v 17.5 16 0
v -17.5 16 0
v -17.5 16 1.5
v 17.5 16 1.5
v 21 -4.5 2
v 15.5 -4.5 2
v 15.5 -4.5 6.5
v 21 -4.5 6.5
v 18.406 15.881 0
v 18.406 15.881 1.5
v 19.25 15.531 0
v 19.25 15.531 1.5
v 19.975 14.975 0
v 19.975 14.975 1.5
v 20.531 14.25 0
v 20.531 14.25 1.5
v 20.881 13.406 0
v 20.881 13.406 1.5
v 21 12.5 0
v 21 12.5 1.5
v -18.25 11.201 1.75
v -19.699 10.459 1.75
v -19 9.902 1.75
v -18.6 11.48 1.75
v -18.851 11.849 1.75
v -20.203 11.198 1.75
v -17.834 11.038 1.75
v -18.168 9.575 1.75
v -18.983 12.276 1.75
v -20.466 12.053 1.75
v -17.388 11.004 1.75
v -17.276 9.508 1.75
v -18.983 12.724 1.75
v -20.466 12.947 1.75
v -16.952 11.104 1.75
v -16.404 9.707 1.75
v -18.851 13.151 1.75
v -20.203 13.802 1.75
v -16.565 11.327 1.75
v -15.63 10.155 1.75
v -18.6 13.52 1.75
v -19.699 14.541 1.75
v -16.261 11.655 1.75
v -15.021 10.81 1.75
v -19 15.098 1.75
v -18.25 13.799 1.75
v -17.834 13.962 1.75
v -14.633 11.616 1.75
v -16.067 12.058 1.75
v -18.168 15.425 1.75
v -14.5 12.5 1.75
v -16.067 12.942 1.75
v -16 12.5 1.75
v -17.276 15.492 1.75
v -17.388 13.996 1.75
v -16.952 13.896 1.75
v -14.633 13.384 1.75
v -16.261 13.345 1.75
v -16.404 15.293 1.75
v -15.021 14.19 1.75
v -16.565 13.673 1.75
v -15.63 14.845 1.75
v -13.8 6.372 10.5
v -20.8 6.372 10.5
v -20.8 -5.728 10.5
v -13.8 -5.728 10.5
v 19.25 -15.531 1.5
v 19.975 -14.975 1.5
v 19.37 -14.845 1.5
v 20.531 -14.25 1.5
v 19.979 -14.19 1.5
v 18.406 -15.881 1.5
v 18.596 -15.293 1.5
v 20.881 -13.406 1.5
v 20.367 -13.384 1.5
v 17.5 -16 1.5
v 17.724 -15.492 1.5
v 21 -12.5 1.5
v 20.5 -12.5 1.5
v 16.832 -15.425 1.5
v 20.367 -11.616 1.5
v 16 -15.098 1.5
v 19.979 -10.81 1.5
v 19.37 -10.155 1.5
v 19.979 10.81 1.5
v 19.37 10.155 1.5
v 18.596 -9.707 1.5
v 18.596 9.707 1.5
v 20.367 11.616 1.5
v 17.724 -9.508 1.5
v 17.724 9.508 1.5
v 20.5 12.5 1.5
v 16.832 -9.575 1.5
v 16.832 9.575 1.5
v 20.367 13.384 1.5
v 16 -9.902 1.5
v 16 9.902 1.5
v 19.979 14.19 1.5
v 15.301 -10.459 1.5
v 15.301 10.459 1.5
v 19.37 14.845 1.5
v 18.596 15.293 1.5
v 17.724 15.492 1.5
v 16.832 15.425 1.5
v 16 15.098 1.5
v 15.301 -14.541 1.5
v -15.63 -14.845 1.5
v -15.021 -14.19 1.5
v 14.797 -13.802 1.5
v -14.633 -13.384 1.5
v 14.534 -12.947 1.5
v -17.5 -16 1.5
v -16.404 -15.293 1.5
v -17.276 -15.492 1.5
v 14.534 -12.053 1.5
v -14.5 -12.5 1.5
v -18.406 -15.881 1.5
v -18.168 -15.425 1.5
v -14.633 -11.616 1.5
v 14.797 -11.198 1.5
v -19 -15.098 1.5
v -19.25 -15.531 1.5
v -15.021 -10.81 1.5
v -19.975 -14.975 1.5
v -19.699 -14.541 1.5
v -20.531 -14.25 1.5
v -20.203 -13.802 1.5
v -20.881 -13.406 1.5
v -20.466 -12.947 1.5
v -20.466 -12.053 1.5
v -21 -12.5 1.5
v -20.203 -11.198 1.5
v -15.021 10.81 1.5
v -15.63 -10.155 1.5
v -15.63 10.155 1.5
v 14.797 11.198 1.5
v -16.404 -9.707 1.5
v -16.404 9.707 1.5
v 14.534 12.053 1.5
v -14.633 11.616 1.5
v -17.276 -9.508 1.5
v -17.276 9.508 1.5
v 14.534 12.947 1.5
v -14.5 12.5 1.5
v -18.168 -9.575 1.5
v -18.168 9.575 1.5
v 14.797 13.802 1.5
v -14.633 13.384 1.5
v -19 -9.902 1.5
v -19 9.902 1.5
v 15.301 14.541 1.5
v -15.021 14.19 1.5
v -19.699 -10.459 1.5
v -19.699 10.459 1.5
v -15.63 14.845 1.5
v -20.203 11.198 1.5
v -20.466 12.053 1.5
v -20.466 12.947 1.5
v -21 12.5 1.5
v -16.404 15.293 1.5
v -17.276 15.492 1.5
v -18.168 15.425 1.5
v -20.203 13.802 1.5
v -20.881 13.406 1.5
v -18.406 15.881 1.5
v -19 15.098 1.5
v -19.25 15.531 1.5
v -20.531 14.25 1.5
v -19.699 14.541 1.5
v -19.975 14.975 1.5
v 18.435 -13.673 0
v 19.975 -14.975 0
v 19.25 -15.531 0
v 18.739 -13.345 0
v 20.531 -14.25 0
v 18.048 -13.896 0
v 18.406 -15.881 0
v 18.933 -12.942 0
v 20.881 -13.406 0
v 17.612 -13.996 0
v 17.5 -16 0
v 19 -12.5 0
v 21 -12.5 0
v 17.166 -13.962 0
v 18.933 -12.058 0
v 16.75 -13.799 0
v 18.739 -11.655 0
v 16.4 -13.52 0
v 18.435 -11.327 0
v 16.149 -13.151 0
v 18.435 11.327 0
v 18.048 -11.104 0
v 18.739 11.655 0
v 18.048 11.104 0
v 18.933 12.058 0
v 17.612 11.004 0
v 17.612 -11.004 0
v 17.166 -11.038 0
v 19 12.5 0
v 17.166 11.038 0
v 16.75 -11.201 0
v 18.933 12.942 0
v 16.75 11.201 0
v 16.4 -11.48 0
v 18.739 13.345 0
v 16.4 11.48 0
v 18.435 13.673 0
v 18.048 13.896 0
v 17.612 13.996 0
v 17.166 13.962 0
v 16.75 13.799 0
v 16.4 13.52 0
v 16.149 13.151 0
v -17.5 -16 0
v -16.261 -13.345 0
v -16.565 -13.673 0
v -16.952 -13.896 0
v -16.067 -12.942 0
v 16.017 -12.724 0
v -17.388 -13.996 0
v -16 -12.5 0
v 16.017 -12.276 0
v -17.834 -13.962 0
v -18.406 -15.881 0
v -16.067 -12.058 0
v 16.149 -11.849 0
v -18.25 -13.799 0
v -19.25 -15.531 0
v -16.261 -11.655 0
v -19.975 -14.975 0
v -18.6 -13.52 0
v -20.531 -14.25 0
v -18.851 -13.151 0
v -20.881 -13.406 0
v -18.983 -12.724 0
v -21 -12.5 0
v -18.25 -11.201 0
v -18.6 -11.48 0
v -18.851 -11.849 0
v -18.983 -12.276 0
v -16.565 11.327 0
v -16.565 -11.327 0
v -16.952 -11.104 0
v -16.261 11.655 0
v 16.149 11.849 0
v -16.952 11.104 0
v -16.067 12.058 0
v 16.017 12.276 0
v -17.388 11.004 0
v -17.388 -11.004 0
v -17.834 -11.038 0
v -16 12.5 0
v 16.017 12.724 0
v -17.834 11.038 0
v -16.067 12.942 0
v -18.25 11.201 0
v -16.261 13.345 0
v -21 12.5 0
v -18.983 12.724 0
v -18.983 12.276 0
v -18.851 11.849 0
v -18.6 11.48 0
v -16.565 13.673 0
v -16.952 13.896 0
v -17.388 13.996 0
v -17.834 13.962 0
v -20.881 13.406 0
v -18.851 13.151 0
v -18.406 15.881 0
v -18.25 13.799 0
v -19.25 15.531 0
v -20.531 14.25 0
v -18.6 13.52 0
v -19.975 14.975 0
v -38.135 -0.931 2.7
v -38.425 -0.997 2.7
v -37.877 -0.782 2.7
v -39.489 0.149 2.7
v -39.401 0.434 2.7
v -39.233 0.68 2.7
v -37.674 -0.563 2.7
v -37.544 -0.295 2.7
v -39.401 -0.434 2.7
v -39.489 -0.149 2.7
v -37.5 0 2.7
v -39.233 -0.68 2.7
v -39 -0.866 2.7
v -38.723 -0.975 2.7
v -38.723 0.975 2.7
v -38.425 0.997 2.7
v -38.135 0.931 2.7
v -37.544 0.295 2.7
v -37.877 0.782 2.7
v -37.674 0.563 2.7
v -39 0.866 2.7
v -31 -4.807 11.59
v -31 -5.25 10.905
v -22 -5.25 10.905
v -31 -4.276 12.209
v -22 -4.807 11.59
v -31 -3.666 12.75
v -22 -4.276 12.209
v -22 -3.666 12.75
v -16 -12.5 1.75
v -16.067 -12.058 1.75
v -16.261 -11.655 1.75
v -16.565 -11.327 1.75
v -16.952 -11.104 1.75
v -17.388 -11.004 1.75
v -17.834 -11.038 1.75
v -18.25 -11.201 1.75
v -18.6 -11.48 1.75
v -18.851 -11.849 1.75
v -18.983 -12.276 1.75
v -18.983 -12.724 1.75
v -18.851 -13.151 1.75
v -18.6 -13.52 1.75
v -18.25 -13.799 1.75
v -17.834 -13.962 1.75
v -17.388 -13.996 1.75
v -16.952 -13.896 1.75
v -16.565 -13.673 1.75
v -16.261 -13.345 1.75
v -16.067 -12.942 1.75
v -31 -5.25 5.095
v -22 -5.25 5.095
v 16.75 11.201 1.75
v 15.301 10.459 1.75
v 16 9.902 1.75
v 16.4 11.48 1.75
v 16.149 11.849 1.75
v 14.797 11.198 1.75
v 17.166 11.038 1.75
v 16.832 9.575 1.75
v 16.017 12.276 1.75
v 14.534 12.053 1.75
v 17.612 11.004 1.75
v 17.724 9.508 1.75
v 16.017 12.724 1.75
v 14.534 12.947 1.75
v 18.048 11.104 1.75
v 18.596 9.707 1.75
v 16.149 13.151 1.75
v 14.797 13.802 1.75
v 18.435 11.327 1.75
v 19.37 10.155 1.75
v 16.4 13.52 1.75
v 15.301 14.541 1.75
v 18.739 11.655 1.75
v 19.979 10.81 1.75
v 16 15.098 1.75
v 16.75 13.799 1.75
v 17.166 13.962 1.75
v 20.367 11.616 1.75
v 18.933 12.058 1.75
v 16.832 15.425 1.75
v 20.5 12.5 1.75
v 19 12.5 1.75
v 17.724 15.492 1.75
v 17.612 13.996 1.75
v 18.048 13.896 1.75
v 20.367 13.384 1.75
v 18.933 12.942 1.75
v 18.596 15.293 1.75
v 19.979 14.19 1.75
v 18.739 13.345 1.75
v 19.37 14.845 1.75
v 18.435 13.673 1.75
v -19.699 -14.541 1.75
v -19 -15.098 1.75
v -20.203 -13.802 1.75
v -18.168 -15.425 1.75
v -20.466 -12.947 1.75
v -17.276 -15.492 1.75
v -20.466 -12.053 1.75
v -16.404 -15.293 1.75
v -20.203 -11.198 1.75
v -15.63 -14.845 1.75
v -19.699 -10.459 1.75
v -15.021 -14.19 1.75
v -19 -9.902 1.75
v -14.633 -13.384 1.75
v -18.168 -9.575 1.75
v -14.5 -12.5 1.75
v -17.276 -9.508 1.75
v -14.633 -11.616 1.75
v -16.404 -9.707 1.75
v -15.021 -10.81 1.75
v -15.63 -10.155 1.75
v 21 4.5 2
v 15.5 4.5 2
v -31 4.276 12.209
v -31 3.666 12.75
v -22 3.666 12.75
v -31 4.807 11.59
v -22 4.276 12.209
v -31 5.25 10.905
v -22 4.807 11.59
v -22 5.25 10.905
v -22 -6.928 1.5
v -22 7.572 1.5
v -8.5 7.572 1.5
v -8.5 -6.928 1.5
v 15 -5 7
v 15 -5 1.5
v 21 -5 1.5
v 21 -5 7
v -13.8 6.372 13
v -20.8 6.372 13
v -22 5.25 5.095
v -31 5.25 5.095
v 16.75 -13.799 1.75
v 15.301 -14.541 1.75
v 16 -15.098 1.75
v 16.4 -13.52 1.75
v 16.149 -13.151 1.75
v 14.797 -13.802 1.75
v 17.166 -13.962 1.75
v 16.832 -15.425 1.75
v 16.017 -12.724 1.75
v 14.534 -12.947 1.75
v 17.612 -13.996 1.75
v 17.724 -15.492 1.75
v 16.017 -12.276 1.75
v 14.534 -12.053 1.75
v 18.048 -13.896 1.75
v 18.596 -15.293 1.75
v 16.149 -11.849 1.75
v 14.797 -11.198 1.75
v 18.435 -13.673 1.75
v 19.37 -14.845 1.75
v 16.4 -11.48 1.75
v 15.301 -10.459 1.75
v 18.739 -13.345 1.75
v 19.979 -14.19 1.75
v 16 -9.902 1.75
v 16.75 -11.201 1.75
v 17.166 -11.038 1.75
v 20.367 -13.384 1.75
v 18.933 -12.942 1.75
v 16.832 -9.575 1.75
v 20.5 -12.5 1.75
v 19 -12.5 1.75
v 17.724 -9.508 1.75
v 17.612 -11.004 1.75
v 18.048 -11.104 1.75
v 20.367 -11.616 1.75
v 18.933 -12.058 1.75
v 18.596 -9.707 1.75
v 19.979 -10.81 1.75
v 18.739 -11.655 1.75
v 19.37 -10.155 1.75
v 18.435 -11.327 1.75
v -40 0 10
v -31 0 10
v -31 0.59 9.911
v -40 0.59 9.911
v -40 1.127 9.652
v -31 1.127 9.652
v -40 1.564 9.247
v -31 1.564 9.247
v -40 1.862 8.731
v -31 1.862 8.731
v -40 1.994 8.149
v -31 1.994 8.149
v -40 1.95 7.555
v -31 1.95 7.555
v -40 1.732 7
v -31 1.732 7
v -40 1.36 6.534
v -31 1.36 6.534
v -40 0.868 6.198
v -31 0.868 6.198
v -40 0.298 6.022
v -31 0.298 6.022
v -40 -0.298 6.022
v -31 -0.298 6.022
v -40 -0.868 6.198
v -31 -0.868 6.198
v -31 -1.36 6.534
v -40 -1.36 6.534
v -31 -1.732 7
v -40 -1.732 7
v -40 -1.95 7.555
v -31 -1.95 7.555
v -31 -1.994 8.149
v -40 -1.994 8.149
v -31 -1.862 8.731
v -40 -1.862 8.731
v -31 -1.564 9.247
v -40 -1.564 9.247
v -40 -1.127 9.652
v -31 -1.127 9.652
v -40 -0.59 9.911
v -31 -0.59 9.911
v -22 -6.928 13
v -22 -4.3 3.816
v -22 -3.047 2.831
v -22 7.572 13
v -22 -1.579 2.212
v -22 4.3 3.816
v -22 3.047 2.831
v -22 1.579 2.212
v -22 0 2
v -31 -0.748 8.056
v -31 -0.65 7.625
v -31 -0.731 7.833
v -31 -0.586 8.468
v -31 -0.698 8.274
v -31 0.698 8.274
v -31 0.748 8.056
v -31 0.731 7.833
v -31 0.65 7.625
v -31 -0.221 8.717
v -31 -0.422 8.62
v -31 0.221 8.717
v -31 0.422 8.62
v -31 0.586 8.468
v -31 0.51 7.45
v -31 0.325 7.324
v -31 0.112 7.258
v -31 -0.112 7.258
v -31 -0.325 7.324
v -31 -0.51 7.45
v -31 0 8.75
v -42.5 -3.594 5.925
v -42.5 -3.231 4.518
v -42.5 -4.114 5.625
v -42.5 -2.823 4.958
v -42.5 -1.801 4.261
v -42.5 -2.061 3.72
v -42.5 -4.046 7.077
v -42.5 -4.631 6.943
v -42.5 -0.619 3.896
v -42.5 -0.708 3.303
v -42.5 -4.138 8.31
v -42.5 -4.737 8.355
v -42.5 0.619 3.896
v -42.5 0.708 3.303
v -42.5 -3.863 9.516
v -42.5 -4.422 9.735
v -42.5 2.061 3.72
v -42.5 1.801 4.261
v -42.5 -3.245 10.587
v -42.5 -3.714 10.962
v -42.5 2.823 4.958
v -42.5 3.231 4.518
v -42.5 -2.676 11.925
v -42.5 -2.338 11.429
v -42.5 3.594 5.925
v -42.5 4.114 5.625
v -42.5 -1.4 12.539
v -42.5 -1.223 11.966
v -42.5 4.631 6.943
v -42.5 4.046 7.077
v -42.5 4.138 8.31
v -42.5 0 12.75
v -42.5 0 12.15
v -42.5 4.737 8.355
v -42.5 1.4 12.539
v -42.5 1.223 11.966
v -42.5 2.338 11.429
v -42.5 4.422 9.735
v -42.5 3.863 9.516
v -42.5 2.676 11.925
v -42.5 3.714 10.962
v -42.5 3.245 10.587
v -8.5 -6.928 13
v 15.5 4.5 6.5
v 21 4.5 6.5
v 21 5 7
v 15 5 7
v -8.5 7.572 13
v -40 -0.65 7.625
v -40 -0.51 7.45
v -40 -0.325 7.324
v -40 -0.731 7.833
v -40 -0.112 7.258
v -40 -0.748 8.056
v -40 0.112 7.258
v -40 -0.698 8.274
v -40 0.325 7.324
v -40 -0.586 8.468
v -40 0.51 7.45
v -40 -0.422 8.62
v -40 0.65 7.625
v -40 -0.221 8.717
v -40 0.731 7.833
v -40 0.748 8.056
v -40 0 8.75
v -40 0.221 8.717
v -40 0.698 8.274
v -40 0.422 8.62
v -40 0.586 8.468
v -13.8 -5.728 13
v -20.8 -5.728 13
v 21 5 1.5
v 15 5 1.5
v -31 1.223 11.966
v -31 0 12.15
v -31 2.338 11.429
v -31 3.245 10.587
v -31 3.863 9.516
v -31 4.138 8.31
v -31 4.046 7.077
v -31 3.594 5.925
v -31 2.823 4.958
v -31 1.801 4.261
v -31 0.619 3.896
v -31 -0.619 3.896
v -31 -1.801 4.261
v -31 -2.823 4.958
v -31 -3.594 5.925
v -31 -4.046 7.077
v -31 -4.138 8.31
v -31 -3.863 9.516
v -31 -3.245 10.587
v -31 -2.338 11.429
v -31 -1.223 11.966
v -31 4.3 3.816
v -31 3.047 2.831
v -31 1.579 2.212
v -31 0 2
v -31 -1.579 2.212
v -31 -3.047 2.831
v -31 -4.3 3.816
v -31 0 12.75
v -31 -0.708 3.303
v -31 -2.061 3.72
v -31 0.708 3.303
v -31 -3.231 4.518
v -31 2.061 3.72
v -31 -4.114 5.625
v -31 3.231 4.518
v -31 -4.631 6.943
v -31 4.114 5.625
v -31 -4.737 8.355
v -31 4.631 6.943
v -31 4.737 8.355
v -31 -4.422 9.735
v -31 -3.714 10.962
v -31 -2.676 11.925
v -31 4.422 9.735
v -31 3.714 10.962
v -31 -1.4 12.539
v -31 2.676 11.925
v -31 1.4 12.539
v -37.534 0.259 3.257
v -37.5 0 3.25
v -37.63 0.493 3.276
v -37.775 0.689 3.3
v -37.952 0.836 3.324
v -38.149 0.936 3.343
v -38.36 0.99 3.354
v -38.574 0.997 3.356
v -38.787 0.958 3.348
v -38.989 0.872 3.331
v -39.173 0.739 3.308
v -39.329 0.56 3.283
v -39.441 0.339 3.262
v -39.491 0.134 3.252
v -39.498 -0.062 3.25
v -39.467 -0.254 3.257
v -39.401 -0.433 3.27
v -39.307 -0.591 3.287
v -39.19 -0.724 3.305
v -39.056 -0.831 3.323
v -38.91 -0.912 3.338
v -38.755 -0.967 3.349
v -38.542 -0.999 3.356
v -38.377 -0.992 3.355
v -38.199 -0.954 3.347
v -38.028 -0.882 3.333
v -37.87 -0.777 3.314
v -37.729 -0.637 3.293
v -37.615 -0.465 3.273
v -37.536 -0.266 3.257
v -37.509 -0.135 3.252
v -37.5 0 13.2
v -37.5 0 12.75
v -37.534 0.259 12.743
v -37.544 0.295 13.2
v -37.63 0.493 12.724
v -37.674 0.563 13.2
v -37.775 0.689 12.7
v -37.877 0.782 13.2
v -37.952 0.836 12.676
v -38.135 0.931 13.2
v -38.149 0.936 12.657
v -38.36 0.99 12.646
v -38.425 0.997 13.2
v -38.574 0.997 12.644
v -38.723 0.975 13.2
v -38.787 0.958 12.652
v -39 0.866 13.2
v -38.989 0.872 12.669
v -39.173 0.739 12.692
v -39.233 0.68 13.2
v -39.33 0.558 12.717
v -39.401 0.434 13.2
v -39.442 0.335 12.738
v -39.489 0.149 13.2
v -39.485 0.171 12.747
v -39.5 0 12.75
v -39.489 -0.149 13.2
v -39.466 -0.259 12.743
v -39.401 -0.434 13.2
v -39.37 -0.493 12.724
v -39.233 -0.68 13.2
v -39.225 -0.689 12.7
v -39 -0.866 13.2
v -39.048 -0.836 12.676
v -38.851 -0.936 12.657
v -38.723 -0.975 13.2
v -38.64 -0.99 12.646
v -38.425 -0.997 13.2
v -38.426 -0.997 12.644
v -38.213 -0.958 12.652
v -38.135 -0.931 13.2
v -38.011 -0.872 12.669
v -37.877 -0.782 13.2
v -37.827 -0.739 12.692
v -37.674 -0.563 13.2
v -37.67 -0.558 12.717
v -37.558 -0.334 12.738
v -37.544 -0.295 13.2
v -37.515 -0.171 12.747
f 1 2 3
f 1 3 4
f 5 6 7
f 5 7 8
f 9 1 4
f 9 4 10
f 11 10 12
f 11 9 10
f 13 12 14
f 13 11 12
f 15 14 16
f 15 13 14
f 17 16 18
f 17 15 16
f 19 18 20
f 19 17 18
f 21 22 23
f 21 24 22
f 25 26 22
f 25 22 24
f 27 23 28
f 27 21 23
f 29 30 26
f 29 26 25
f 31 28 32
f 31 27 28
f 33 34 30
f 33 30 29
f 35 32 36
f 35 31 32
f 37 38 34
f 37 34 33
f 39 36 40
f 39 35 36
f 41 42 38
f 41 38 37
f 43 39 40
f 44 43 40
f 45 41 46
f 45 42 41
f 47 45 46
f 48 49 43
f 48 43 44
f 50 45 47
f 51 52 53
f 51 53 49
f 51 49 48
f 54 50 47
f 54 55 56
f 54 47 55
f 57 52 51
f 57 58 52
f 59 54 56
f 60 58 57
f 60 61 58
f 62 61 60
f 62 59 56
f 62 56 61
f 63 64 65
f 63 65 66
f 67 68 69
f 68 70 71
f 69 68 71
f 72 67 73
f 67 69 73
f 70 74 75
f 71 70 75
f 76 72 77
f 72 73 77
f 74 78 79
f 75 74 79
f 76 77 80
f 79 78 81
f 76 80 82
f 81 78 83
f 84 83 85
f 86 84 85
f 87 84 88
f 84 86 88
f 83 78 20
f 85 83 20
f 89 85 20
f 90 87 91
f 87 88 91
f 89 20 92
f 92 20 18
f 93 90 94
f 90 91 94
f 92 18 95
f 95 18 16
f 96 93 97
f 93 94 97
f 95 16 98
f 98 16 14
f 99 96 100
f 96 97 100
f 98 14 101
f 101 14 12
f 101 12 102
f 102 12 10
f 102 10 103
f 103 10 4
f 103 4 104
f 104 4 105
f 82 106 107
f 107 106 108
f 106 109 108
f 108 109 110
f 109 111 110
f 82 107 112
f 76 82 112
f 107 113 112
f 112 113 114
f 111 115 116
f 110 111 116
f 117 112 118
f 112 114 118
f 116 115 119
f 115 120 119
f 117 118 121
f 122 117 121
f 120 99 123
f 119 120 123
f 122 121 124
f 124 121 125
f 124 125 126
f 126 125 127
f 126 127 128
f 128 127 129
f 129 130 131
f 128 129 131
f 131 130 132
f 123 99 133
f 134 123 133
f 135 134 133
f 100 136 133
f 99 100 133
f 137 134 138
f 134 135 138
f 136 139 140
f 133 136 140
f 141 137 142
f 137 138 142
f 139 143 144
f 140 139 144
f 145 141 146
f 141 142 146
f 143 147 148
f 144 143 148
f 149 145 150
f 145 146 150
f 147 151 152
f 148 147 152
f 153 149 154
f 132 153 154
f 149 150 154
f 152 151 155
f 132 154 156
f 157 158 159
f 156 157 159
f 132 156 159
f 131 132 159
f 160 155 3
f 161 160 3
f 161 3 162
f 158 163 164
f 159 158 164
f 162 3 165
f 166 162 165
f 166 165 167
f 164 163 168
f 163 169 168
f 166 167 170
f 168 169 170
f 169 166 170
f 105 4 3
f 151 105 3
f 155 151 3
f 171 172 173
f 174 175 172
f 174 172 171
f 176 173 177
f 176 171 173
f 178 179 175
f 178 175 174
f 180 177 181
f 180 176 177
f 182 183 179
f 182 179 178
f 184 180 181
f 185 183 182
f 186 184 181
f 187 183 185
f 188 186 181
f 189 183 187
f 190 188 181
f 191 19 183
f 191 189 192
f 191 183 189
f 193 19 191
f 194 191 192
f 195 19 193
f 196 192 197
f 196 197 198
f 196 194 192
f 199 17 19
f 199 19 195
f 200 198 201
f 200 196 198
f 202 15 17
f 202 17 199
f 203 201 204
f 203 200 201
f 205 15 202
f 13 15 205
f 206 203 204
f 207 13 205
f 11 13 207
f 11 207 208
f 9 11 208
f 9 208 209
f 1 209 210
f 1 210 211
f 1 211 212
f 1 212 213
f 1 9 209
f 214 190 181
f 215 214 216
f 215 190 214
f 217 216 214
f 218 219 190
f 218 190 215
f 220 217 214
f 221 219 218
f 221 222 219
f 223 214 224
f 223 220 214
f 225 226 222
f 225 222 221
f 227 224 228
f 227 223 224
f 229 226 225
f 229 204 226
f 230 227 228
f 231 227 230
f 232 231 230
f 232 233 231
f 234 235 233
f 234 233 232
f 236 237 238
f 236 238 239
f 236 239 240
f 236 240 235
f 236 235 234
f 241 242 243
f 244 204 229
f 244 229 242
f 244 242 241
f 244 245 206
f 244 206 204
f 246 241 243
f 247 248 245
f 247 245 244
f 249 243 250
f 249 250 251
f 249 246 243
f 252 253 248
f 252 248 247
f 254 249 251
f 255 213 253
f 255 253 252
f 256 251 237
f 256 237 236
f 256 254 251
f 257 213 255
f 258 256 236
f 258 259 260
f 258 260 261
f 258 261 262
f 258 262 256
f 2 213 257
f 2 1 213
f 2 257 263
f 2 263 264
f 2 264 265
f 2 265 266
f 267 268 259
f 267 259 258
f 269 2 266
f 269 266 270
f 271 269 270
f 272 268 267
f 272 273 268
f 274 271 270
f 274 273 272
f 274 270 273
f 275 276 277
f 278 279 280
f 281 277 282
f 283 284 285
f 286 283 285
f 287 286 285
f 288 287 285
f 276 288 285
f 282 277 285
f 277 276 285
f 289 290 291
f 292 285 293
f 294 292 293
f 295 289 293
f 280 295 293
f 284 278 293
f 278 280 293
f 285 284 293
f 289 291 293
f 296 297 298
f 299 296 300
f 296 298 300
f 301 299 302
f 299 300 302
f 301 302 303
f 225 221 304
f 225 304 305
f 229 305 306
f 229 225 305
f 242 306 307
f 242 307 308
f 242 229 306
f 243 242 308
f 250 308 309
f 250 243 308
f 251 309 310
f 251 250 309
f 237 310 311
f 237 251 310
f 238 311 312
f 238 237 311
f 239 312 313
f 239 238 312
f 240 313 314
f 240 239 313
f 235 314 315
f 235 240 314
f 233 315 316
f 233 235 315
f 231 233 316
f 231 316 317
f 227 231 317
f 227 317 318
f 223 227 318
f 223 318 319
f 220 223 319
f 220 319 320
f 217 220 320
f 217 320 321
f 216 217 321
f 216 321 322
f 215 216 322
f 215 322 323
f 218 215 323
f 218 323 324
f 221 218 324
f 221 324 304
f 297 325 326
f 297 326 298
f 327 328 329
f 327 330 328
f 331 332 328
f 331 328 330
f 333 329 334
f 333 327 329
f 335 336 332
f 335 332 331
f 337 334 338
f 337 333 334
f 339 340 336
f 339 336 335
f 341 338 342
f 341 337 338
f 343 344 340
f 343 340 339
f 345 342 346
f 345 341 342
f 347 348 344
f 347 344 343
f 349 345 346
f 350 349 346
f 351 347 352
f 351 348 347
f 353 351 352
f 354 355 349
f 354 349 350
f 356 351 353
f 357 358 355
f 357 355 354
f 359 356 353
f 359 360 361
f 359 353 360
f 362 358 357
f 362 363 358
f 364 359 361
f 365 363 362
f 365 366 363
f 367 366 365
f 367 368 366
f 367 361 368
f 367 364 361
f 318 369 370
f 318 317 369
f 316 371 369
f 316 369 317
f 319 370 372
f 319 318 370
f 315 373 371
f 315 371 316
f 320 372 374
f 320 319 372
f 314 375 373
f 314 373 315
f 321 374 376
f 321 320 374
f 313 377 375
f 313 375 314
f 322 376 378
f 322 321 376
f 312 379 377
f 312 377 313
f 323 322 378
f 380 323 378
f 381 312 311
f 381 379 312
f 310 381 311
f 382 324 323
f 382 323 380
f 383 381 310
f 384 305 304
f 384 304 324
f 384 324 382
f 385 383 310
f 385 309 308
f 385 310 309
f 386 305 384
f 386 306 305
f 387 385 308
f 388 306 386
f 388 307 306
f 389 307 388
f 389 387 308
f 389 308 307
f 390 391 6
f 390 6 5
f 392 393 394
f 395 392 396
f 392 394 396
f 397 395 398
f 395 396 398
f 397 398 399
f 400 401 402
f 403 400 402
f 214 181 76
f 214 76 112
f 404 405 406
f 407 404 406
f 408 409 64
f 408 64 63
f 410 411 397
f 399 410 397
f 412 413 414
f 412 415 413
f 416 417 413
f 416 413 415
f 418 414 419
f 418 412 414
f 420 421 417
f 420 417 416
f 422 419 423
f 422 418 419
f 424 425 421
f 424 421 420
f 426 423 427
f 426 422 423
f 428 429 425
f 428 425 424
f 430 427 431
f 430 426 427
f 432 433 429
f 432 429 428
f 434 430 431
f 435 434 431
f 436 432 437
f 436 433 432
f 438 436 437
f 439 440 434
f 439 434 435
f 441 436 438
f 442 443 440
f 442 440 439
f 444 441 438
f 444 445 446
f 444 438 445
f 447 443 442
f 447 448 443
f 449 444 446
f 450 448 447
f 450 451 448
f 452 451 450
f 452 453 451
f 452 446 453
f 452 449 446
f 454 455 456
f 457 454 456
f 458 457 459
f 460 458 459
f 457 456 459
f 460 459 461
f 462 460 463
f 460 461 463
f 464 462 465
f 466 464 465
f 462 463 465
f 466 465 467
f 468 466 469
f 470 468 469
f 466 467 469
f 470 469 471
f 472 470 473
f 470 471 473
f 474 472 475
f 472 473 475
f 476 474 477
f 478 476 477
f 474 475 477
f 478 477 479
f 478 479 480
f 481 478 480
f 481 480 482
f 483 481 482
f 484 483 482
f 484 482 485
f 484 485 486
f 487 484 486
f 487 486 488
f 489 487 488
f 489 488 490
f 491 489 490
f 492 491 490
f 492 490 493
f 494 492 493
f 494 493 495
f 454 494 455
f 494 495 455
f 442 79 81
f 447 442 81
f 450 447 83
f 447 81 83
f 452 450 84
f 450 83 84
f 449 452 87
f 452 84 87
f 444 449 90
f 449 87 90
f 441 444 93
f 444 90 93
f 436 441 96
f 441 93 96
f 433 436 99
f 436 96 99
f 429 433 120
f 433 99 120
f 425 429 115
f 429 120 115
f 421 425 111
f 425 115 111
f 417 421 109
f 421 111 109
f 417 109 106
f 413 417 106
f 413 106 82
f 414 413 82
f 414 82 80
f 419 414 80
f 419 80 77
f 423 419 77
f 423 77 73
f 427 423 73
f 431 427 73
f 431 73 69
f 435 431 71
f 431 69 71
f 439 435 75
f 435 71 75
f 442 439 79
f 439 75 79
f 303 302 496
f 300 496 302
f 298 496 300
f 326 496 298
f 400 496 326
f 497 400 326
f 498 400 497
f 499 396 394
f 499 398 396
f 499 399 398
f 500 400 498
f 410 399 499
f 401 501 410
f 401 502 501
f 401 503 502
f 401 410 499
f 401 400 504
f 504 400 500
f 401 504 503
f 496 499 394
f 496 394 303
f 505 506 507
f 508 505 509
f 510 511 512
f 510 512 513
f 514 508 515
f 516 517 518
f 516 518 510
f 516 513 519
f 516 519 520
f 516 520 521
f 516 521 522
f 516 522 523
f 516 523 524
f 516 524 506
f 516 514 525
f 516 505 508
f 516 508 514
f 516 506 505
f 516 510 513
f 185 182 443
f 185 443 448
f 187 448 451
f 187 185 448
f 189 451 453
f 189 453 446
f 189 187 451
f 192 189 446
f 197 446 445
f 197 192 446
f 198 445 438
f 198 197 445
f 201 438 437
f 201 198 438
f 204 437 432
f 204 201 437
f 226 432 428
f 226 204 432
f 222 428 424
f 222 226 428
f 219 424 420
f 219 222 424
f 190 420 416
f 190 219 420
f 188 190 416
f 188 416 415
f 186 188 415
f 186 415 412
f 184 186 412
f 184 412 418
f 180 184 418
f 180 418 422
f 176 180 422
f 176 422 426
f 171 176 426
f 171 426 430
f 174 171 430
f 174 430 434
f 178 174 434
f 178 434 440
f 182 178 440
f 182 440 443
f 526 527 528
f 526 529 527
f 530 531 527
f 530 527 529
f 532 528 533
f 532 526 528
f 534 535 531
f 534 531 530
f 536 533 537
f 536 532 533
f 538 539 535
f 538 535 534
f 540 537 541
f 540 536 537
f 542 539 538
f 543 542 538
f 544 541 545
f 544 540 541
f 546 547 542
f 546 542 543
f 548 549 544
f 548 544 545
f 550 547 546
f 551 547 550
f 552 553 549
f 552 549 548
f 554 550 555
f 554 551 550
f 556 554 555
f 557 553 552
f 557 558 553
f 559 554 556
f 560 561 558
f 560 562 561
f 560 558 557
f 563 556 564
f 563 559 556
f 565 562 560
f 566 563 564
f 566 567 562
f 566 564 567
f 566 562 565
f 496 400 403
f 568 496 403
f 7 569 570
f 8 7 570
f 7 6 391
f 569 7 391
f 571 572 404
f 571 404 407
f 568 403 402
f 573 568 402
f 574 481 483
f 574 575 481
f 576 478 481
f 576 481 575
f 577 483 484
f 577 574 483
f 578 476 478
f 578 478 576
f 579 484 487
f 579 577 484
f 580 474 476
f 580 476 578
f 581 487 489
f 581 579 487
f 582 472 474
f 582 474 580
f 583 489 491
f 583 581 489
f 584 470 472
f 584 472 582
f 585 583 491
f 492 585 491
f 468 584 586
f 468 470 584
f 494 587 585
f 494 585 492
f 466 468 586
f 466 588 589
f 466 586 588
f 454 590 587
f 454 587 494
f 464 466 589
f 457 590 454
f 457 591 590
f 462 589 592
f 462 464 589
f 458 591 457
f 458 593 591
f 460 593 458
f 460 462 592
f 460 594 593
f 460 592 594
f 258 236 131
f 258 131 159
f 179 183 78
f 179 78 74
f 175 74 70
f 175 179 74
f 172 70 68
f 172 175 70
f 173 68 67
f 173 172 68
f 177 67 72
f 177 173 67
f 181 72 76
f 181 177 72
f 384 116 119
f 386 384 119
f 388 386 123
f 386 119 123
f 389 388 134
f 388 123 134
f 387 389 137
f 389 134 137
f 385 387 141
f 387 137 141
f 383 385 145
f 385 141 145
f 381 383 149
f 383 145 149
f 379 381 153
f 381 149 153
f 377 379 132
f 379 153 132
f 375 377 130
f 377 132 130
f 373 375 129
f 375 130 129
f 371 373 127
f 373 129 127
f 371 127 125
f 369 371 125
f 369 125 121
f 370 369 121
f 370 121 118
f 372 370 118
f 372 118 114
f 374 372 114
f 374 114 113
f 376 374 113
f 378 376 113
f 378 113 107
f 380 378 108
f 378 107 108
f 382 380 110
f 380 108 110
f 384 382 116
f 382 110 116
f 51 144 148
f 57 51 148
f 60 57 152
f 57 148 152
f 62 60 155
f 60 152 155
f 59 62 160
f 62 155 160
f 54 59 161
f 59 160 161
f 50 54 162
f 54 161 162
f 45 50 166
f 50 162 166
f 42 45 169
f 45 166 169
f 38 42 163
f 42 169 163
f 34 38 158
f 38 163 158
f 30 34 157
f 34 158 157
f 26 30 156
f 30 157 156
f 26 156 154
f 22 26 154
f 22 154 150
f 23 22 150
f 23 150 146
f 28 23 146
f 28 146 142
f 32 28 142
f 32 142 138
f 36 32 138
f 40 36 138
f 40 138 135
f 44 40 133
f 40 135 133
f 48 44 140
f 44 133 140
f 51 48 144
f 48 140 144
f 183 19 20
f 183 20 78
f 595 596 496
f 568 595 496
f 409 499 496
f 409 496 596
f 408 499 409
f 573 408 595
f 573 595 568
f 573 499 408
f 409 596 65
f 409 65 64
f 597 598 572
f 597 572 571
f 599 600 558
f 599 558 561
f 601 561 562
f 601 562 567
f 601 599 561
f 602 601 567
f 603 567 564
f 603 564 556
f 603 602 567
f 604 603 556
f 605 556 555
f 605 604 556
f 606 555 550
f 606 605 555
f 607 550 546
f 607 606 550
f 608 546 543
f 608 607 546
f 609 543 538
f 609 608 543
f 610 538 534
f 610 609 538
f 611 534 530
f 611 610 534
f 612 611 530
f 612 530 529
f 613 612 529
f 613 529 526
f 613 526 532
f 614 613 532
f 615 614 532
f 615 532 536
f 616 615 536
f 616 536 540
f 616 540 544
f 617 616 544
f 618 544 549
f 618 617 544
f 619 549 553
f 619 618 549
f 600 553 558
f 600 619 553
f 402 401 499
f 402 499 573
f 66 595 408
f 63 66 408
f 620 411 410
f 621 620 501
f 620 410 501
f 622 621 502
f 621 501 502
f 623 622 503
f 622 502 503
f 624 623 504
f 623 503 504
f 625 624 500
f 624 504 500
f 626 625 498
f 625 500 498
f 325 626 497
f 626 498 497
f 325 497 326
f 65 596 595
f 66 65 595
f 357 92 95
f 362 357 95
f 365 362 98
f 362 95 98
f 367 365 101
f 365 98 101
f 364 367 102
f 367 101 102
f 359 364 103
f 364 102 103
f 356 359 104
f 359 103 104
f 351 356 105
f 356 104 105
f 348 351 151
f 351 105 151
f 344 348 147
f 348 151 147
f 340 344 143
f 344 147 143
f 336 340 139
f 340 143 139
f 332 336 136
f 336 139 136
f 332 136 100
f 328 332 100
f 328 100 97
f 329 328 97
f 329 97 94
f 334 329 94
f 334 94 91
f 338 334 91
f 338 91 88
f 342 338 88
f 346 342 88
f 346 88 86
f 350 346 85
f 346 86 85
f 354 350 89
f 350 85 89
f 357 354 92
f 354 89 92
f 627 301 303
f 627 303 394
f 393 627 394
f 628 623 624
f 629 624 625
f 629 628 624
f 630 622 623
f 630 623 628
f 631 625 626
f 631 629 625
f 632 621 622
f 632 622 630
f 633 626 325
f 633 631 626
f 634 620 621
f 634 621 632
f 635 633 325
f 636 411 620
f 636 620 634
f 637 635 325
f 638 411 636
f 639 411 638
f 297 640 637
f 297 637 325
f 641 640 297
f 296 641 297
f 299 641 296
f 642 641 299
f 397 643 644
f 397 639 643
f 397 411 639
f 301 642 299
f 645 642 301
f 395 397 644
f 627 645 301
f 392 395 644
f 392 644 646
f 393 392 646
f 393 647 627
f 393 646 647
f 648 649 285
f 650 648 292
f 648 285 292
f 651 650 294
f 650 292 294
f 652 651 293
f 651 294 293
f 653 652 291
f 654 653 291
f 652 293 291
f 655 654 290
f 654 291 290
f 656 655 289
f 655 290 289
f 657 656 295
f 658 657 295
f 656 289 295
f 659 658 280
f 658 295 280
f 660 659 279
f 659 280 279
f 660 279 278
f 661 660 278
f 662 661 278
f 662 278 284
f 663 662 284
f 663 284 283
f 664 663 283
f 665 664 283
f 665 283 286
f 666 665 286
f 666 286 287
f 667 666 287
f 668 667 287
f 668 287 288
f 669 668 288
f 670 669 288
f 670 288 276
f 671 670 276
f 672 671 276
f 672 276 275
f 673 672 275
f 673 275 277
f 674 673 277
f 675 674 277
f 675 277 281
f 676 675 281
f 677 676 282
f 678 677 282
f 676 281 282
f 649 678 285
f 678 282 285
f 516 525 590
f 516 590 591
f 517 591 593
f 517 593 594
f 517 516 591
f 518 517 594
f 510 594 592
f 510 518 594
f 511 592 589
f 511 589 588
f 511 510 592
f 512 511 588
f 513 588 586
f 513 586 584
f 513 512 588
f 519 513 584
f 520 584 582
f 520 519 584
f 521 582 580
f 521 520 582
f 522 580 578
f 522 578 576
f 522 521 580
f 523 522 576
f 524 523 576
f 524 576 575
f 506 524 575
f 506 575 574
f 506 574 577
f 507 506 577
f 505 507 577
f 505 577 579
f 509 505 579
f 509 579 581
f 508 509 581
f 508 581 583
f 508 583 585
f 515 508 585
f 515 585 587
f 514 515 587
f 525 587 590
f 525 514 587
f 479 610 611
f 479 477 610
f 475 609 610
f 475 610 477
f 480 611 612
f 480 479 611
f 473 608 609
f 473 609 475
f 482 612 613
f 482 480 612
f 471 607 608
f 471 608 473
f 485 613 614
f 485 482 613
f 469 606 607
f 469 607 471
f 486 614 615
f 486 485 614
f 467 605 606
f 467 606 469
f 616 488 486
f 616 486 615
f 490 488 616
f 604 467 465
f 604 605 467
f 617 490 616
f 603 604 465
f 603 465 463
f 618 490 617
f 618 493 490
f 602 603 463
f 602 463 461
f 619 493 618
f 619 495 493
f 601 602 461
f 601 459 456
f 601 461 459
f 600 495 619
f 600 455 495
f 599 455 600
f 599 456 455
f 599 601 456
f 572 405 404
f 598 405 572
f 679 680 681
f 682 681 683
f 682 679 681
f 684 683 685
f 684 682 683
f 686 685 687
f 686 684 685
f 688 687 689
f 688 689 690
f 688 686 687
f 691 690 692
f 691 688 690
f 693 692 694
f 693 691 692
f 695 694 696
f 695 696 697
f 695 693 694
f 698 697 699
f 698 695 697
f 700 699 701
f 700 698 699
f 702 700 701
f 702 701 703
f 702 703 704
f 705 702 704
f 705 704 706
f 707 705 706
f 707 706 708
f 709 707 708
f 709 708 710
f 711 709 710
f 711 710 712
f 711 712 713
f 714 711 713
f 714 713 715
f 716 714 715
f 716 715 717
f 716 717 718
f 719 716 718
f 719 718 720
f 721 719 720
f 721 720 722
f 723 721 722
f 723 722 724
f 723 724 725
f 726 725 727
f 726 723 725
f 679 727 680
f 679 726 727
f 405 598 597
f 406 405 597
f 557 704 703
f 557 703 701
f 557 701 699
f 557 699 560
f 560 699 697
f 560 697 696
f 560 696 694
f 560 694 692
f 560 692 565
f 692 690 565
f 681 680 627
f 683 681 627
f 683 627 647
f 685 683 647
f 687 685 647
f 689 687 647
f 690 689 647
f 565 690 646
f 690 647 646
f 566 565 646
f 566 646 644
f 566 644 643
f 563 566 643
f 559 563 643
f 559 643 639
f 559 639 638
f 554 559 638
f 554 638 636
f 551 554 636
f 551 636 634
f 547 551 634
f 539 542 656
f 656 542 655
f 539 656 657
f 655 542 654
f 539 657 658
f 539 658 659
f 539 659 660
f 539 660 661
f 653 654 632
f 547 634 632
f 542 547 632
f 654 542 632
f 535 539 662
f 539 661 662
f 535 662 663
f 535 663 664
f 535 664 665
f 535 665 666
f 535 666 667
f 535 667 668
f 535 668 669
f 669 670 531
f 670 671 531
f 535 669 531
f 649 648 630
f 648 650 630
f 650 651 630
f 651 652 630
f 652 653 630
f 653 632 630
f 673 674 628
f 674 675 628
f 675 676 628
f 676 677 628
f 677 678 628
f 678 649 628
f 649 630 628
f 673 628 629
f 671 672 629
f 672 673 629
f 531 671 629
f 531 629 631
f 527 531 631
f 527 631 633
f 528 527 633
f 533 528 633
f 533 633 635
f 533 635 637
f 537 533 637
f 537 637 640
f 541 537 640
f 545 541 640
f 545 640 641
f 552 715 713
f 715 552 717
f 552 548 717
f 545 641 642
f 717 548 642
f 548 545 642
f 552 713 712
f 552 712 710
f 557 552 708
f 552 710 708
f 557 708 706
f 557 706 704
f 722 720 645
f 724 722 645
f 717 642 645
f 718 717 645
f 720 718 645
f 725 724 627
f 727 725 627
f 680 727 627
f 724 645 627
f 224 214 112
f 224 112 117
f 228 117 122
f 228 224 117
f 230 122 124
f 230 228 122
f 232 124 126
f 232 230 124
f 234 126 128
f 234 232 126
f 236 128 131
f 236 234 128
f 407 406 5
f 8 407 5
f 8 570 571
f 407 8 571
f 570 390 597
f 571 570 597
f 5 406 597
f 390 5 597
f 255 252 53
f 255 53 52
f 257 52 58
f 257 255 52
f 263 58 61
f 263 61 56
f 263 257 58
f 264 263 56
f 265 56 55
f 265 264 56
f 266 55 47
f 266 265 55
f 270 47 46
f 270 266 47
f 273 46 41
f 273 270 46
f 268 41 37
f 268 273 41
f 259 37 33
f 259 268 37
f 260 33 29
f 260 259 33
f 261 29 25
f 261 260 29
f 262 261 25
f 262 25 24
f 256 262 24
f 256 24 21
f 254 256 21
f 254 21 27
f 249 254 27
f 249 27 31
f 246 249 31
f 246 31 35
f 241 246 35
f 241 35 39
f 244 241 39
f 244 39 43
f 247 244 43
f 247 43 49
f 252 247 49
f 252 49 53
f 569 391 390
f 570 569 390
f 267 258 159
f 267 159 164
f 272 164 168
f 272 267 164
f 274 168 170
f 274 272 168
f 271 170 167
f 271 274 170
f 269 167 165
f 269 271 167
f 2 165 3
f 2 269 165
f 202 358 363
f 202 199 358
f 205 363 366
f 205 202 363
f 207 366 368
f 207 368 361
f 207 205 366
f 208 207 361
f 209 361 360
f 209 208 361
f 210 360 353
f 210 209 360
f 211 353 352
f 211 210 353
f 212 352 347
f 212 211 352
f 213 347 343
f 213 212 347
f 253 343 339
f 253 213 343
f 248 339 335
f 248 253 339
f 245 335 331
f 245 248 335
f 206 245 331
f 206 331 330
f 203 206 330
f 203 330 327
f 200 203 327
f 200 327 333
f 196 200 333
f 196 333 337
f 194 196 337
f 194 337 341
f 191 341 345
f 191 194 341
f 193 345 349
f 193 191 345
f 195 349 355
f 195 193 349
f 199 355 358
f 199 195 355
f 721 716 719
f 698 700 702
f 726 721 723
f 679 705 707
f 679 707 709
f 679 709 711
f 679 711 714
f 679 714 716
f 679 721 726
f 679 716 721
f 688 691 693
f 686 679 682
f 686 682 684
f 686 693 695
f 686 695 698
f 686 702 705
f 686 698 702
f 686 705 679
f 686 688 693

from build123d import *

# Parameters (mm, degrees)
ESQUISSE1_R             = 1.5
BOSS_EXTRU_1_DEPTH      = 1.5
ESQUISSE2_R             = 3
ESQUISSE2_R_2           = 1.5
BOSS_EXTRU_2_DEPTH      = 0.25
ESQUISSE4_W             = 13.5
ESQUISSE4_H             = 14.5
BOSS_EXTRU_3_DEPTH      = 11.5
ESQUISSE5_W             = 7
ESQUISSE5_H             = 12.1
ENL_V_MAT_EXTRU_1_DEPTH = 2.5
ESQUISSE6_R             = 6
BOSS_EXTRU_4_DEPTH      = 9
ESQUISSE7_R             = 4.75
ESQUISSE7_R_2           = 4.15
BOSS_EXTRU_5_DEPTH      = 11.5
ESQUISSE8_OUTSIDE_W     = 30.494
ESQUISSE8_OUTSIDE_H     = 48.494
ESQUISSE8_OUTSIDE_W_2   = 10.966230641
ESQUISSE8_OUTSIDE_H_2   = 10.5
ENL_V_MAT_EXTRU_2_DEPTH = 9
ESQUISSE9_R             = 1
BOSS_EXTRU_6_DEPTH      = 1
BOSS_EXTRU_7_START      = -10.5
ESQUISSE9_2_R           = 1
BOSS_EXTRU_7_DEPTH      = 1
ESQUISSE10_R            = 2
ESQUISSE10_R_2          = 0.75
BOSS_EXTRU_8_DEPTH      = 9
ESQUISSE11_W            = 6
ESQUISSE11_H            = 10
BOSS_EXTRU_9_DEPTH      = 5.5
COQUE1_T                = -0.5


with BuildPart() as part:
    # Esquisse1 → Boss.-Extru.1 (new body)
    with BuildSketch(Plane.XY):
        with BuildLine():
            ThreePointArc((-21, 12.5), (-19.974873734, 14.974873734), (-17.5, 16))
            Line((-17.5, 16), (17.5, 16))
            ThreePointArc((17.5, 16), (19.974873734, 14.974873734), (21, 12.5))
            Line((21, 12.5), (21, -12.5))
            ThreePointArc((21, -12.5), (19.974873734, -14.974873734), (17.5, -16))
            Line((17.5, -16), (-17.5, -16))
            ThreePointArc((-17.5, -16), (-19.974873734, -14.974873734), (-21, -12.5))
            Line((-21, -12.5), (-21, 12.5))
        make_face()
        with Locations((17.5, -12.5)):
            Circle(ESQUISSE1_R, mode=Mode.SUBTRACT)
        with Locations((17.5, 12.5)):
            Circle(ESQUISSE1_R, mode=Mode.SUBTRACT)
        with Locations((-17.5, -12.5)):
            Circle(ESQUISSE1_R, mode=Mode.SUBTRACT)
        with Locations((-17.5, 12.5)):
            Circle(ESQUISSE1_R, mode=Mode.SUBTRACT)
    extrude(amount=BOSS_EXTRU_1_DEPTH)

    # Esquisse2 → Boss.-Extru.2 (add)
    # profile 1 of 4: a face of its own
    with BuildSketch(Plane.XY.offset(1.5)):
        with Locations((17.5, 12.5)):
            Circle(ESQUISSE2_R)
        with Locations((17.5, 12.5)):
            Circle(ESQUISSE2_R_2, mode=Mode.SUBTRACT)
    # profile 2 of 4: a face of its own
    with BuildSketch(Plane.XY.offset(1.5)):
        with Locations((-17.5, 12.5)):
            Circle(ESQUISSE2_R)
        with Locations((-17.5, 12.5)):
            Circle(ESQUISSE2_R_2, mode=Mode.SUBTRACT)
    # profile 3 of 4: a face of its own
    with BuildSketch(Plane.XY.offset(1.5)):
        with Locations((-17.5, -12.5)):
            Circle(ESQUISSE2_R)
        with Locations((-17.5, -12.5)):
            Circle(ESQUISSE2_R_2, mode=Mode.SUBTRACT)
    # profile 4 of 4: a face of its own
    with BuildSketch(Plane.XY.offset(1.5)):
        with Locations((17.5, -12.5)):
            Circle(ESQUISSE2_R)
        with Locations((17.5, -12.5)):
            Circle(ESQUISSE2_R_2, mode=Mode.SUBTRACT)
    extrude(amount=BOSS_EXTRU_2_DEPTH)


with BuildPart() as body_2:
    # Esquisse4 → Boss.-Extru.3 (new body)
    with BuildSketch(Plane.XY.offset(1.5)):
        with Locations((-15.25, 0.32202456)):
            Rectangle(ESQUISSE4_W, ESQUISSE4_H)
    extrude(amount=BOSS_EXTRU_3_DEPTH)

    # Esquisse5 → Enlèv. mat.-Extru.1 (cut)
    with BuildSketch(Plane.XY.offset(13)):
        with Locations((-17.3, 0.32202456)):
            Rectangle(ESQUISSE5_W, ESQUISSE5_H)
    extrude(amount=-ENL_V_MAT_EXTRU_1_DEPTH, mode=Mode.SUBTRACT)

    # Esquisse6 → Boss.-Extru.4 (add)
    with BuildSketch(Plane.ZY.offset(22)):
        with Locations(Location((8, 0, 0), (0, 0, 326.442690238))):
            Circle(ESQUISSE6_R)
    extrude(amount=BOSS_EXTRU_4_DEPTH)

    # Esquisse7 → Boss.-Extru.5 (add)
    with BuildSketch(Plane.ZY.offset(31)):
        with Locations((8, 0)):
            Circle(ESQUISSE7_R)
        with Locations((8, 0)):
            Circle(ESQUISSE7_R_2, mode=Mode.SUBTRACT)
    extrude(amount=BOSS_EXTRU_5_DEPTH)

    # Esquisse8 outside → Enlèv. mat.-Extru.2 (cut)
    with BuildSketch(Plane.ZY.offset(31)):
        with Locations((7, 0)):
            Rectangle(ESQUISSE8_OUTSIDE_W, ESQUISSE8_OUTSIDE_H)
        with Locations((7.26688468, 0)):
            Rectangle(ESQUISSE8_OUTSIDE_W_2, ESQUISSE8_OUTSIDE_H_2, mode=Mode.SUBTRACT)
    extrude(amount=-ENL_V_MAT_EXTRU_2_DEPTH, mode=Mode.SUBTRACT)

    # Esquisse9 → Boss.-Extru.6 (add)
    with BuildSketch(Plane.XY.offset(13.2)):
        with Locations((-38.5, 0)):
            Circle(ESQUISSE9_R)
    extrude(amount=-BOSS_EXTRU_6_DEPTH)

    # Esquisse9<2> → Boss.-Extru.7 (add)
    with BuildSketch(Plane.XY.offset(13.2).offset(BOSS_EXTRU_7_START)):
        with Locations((-38.5, 0)):
            Circle(ESQUISSE9_2_R)
    extrude(amount=BOSS_EXTRU_7_DEPTH)

    # Esquisse10 → Boss.-Extru.8 (add)
    with BuildSketch(Plane.ZY.offset(31)):
        with Locations((8, 0)):
            Circle(ESQUISSE10_R)
        with Locations((8, 0)):
            Circle(ESQUISSE10_R_2, mode=Mode.SUBTRACT)
    extrude(amount=BOSS_EXTRU_8_DEPTH)


with BuildPart() as body_3:
    # Esquisse11 → Boss.-Extru.9 (new body)
    with BuildSketch(Plane.XY.offset(1.5)):
        with Locations((18, 0)):
            Rectangle(ESQUISSE11_W, ESQUISSE11_H)
    extrude(amount=BOSS_EXTRU_9_DEPTH)

    # Coque1
    coque1_openings = [body_3.faces().sort_by_distance(p)[0] for p in [
        (21, 0, 4.25),
    ]]
    offset(amount=COQUE1_T, openings=coque1_openings, kind=Kind.INTERSECTION)


solid = Compound([part.part, body_2.part, body_3.part])
